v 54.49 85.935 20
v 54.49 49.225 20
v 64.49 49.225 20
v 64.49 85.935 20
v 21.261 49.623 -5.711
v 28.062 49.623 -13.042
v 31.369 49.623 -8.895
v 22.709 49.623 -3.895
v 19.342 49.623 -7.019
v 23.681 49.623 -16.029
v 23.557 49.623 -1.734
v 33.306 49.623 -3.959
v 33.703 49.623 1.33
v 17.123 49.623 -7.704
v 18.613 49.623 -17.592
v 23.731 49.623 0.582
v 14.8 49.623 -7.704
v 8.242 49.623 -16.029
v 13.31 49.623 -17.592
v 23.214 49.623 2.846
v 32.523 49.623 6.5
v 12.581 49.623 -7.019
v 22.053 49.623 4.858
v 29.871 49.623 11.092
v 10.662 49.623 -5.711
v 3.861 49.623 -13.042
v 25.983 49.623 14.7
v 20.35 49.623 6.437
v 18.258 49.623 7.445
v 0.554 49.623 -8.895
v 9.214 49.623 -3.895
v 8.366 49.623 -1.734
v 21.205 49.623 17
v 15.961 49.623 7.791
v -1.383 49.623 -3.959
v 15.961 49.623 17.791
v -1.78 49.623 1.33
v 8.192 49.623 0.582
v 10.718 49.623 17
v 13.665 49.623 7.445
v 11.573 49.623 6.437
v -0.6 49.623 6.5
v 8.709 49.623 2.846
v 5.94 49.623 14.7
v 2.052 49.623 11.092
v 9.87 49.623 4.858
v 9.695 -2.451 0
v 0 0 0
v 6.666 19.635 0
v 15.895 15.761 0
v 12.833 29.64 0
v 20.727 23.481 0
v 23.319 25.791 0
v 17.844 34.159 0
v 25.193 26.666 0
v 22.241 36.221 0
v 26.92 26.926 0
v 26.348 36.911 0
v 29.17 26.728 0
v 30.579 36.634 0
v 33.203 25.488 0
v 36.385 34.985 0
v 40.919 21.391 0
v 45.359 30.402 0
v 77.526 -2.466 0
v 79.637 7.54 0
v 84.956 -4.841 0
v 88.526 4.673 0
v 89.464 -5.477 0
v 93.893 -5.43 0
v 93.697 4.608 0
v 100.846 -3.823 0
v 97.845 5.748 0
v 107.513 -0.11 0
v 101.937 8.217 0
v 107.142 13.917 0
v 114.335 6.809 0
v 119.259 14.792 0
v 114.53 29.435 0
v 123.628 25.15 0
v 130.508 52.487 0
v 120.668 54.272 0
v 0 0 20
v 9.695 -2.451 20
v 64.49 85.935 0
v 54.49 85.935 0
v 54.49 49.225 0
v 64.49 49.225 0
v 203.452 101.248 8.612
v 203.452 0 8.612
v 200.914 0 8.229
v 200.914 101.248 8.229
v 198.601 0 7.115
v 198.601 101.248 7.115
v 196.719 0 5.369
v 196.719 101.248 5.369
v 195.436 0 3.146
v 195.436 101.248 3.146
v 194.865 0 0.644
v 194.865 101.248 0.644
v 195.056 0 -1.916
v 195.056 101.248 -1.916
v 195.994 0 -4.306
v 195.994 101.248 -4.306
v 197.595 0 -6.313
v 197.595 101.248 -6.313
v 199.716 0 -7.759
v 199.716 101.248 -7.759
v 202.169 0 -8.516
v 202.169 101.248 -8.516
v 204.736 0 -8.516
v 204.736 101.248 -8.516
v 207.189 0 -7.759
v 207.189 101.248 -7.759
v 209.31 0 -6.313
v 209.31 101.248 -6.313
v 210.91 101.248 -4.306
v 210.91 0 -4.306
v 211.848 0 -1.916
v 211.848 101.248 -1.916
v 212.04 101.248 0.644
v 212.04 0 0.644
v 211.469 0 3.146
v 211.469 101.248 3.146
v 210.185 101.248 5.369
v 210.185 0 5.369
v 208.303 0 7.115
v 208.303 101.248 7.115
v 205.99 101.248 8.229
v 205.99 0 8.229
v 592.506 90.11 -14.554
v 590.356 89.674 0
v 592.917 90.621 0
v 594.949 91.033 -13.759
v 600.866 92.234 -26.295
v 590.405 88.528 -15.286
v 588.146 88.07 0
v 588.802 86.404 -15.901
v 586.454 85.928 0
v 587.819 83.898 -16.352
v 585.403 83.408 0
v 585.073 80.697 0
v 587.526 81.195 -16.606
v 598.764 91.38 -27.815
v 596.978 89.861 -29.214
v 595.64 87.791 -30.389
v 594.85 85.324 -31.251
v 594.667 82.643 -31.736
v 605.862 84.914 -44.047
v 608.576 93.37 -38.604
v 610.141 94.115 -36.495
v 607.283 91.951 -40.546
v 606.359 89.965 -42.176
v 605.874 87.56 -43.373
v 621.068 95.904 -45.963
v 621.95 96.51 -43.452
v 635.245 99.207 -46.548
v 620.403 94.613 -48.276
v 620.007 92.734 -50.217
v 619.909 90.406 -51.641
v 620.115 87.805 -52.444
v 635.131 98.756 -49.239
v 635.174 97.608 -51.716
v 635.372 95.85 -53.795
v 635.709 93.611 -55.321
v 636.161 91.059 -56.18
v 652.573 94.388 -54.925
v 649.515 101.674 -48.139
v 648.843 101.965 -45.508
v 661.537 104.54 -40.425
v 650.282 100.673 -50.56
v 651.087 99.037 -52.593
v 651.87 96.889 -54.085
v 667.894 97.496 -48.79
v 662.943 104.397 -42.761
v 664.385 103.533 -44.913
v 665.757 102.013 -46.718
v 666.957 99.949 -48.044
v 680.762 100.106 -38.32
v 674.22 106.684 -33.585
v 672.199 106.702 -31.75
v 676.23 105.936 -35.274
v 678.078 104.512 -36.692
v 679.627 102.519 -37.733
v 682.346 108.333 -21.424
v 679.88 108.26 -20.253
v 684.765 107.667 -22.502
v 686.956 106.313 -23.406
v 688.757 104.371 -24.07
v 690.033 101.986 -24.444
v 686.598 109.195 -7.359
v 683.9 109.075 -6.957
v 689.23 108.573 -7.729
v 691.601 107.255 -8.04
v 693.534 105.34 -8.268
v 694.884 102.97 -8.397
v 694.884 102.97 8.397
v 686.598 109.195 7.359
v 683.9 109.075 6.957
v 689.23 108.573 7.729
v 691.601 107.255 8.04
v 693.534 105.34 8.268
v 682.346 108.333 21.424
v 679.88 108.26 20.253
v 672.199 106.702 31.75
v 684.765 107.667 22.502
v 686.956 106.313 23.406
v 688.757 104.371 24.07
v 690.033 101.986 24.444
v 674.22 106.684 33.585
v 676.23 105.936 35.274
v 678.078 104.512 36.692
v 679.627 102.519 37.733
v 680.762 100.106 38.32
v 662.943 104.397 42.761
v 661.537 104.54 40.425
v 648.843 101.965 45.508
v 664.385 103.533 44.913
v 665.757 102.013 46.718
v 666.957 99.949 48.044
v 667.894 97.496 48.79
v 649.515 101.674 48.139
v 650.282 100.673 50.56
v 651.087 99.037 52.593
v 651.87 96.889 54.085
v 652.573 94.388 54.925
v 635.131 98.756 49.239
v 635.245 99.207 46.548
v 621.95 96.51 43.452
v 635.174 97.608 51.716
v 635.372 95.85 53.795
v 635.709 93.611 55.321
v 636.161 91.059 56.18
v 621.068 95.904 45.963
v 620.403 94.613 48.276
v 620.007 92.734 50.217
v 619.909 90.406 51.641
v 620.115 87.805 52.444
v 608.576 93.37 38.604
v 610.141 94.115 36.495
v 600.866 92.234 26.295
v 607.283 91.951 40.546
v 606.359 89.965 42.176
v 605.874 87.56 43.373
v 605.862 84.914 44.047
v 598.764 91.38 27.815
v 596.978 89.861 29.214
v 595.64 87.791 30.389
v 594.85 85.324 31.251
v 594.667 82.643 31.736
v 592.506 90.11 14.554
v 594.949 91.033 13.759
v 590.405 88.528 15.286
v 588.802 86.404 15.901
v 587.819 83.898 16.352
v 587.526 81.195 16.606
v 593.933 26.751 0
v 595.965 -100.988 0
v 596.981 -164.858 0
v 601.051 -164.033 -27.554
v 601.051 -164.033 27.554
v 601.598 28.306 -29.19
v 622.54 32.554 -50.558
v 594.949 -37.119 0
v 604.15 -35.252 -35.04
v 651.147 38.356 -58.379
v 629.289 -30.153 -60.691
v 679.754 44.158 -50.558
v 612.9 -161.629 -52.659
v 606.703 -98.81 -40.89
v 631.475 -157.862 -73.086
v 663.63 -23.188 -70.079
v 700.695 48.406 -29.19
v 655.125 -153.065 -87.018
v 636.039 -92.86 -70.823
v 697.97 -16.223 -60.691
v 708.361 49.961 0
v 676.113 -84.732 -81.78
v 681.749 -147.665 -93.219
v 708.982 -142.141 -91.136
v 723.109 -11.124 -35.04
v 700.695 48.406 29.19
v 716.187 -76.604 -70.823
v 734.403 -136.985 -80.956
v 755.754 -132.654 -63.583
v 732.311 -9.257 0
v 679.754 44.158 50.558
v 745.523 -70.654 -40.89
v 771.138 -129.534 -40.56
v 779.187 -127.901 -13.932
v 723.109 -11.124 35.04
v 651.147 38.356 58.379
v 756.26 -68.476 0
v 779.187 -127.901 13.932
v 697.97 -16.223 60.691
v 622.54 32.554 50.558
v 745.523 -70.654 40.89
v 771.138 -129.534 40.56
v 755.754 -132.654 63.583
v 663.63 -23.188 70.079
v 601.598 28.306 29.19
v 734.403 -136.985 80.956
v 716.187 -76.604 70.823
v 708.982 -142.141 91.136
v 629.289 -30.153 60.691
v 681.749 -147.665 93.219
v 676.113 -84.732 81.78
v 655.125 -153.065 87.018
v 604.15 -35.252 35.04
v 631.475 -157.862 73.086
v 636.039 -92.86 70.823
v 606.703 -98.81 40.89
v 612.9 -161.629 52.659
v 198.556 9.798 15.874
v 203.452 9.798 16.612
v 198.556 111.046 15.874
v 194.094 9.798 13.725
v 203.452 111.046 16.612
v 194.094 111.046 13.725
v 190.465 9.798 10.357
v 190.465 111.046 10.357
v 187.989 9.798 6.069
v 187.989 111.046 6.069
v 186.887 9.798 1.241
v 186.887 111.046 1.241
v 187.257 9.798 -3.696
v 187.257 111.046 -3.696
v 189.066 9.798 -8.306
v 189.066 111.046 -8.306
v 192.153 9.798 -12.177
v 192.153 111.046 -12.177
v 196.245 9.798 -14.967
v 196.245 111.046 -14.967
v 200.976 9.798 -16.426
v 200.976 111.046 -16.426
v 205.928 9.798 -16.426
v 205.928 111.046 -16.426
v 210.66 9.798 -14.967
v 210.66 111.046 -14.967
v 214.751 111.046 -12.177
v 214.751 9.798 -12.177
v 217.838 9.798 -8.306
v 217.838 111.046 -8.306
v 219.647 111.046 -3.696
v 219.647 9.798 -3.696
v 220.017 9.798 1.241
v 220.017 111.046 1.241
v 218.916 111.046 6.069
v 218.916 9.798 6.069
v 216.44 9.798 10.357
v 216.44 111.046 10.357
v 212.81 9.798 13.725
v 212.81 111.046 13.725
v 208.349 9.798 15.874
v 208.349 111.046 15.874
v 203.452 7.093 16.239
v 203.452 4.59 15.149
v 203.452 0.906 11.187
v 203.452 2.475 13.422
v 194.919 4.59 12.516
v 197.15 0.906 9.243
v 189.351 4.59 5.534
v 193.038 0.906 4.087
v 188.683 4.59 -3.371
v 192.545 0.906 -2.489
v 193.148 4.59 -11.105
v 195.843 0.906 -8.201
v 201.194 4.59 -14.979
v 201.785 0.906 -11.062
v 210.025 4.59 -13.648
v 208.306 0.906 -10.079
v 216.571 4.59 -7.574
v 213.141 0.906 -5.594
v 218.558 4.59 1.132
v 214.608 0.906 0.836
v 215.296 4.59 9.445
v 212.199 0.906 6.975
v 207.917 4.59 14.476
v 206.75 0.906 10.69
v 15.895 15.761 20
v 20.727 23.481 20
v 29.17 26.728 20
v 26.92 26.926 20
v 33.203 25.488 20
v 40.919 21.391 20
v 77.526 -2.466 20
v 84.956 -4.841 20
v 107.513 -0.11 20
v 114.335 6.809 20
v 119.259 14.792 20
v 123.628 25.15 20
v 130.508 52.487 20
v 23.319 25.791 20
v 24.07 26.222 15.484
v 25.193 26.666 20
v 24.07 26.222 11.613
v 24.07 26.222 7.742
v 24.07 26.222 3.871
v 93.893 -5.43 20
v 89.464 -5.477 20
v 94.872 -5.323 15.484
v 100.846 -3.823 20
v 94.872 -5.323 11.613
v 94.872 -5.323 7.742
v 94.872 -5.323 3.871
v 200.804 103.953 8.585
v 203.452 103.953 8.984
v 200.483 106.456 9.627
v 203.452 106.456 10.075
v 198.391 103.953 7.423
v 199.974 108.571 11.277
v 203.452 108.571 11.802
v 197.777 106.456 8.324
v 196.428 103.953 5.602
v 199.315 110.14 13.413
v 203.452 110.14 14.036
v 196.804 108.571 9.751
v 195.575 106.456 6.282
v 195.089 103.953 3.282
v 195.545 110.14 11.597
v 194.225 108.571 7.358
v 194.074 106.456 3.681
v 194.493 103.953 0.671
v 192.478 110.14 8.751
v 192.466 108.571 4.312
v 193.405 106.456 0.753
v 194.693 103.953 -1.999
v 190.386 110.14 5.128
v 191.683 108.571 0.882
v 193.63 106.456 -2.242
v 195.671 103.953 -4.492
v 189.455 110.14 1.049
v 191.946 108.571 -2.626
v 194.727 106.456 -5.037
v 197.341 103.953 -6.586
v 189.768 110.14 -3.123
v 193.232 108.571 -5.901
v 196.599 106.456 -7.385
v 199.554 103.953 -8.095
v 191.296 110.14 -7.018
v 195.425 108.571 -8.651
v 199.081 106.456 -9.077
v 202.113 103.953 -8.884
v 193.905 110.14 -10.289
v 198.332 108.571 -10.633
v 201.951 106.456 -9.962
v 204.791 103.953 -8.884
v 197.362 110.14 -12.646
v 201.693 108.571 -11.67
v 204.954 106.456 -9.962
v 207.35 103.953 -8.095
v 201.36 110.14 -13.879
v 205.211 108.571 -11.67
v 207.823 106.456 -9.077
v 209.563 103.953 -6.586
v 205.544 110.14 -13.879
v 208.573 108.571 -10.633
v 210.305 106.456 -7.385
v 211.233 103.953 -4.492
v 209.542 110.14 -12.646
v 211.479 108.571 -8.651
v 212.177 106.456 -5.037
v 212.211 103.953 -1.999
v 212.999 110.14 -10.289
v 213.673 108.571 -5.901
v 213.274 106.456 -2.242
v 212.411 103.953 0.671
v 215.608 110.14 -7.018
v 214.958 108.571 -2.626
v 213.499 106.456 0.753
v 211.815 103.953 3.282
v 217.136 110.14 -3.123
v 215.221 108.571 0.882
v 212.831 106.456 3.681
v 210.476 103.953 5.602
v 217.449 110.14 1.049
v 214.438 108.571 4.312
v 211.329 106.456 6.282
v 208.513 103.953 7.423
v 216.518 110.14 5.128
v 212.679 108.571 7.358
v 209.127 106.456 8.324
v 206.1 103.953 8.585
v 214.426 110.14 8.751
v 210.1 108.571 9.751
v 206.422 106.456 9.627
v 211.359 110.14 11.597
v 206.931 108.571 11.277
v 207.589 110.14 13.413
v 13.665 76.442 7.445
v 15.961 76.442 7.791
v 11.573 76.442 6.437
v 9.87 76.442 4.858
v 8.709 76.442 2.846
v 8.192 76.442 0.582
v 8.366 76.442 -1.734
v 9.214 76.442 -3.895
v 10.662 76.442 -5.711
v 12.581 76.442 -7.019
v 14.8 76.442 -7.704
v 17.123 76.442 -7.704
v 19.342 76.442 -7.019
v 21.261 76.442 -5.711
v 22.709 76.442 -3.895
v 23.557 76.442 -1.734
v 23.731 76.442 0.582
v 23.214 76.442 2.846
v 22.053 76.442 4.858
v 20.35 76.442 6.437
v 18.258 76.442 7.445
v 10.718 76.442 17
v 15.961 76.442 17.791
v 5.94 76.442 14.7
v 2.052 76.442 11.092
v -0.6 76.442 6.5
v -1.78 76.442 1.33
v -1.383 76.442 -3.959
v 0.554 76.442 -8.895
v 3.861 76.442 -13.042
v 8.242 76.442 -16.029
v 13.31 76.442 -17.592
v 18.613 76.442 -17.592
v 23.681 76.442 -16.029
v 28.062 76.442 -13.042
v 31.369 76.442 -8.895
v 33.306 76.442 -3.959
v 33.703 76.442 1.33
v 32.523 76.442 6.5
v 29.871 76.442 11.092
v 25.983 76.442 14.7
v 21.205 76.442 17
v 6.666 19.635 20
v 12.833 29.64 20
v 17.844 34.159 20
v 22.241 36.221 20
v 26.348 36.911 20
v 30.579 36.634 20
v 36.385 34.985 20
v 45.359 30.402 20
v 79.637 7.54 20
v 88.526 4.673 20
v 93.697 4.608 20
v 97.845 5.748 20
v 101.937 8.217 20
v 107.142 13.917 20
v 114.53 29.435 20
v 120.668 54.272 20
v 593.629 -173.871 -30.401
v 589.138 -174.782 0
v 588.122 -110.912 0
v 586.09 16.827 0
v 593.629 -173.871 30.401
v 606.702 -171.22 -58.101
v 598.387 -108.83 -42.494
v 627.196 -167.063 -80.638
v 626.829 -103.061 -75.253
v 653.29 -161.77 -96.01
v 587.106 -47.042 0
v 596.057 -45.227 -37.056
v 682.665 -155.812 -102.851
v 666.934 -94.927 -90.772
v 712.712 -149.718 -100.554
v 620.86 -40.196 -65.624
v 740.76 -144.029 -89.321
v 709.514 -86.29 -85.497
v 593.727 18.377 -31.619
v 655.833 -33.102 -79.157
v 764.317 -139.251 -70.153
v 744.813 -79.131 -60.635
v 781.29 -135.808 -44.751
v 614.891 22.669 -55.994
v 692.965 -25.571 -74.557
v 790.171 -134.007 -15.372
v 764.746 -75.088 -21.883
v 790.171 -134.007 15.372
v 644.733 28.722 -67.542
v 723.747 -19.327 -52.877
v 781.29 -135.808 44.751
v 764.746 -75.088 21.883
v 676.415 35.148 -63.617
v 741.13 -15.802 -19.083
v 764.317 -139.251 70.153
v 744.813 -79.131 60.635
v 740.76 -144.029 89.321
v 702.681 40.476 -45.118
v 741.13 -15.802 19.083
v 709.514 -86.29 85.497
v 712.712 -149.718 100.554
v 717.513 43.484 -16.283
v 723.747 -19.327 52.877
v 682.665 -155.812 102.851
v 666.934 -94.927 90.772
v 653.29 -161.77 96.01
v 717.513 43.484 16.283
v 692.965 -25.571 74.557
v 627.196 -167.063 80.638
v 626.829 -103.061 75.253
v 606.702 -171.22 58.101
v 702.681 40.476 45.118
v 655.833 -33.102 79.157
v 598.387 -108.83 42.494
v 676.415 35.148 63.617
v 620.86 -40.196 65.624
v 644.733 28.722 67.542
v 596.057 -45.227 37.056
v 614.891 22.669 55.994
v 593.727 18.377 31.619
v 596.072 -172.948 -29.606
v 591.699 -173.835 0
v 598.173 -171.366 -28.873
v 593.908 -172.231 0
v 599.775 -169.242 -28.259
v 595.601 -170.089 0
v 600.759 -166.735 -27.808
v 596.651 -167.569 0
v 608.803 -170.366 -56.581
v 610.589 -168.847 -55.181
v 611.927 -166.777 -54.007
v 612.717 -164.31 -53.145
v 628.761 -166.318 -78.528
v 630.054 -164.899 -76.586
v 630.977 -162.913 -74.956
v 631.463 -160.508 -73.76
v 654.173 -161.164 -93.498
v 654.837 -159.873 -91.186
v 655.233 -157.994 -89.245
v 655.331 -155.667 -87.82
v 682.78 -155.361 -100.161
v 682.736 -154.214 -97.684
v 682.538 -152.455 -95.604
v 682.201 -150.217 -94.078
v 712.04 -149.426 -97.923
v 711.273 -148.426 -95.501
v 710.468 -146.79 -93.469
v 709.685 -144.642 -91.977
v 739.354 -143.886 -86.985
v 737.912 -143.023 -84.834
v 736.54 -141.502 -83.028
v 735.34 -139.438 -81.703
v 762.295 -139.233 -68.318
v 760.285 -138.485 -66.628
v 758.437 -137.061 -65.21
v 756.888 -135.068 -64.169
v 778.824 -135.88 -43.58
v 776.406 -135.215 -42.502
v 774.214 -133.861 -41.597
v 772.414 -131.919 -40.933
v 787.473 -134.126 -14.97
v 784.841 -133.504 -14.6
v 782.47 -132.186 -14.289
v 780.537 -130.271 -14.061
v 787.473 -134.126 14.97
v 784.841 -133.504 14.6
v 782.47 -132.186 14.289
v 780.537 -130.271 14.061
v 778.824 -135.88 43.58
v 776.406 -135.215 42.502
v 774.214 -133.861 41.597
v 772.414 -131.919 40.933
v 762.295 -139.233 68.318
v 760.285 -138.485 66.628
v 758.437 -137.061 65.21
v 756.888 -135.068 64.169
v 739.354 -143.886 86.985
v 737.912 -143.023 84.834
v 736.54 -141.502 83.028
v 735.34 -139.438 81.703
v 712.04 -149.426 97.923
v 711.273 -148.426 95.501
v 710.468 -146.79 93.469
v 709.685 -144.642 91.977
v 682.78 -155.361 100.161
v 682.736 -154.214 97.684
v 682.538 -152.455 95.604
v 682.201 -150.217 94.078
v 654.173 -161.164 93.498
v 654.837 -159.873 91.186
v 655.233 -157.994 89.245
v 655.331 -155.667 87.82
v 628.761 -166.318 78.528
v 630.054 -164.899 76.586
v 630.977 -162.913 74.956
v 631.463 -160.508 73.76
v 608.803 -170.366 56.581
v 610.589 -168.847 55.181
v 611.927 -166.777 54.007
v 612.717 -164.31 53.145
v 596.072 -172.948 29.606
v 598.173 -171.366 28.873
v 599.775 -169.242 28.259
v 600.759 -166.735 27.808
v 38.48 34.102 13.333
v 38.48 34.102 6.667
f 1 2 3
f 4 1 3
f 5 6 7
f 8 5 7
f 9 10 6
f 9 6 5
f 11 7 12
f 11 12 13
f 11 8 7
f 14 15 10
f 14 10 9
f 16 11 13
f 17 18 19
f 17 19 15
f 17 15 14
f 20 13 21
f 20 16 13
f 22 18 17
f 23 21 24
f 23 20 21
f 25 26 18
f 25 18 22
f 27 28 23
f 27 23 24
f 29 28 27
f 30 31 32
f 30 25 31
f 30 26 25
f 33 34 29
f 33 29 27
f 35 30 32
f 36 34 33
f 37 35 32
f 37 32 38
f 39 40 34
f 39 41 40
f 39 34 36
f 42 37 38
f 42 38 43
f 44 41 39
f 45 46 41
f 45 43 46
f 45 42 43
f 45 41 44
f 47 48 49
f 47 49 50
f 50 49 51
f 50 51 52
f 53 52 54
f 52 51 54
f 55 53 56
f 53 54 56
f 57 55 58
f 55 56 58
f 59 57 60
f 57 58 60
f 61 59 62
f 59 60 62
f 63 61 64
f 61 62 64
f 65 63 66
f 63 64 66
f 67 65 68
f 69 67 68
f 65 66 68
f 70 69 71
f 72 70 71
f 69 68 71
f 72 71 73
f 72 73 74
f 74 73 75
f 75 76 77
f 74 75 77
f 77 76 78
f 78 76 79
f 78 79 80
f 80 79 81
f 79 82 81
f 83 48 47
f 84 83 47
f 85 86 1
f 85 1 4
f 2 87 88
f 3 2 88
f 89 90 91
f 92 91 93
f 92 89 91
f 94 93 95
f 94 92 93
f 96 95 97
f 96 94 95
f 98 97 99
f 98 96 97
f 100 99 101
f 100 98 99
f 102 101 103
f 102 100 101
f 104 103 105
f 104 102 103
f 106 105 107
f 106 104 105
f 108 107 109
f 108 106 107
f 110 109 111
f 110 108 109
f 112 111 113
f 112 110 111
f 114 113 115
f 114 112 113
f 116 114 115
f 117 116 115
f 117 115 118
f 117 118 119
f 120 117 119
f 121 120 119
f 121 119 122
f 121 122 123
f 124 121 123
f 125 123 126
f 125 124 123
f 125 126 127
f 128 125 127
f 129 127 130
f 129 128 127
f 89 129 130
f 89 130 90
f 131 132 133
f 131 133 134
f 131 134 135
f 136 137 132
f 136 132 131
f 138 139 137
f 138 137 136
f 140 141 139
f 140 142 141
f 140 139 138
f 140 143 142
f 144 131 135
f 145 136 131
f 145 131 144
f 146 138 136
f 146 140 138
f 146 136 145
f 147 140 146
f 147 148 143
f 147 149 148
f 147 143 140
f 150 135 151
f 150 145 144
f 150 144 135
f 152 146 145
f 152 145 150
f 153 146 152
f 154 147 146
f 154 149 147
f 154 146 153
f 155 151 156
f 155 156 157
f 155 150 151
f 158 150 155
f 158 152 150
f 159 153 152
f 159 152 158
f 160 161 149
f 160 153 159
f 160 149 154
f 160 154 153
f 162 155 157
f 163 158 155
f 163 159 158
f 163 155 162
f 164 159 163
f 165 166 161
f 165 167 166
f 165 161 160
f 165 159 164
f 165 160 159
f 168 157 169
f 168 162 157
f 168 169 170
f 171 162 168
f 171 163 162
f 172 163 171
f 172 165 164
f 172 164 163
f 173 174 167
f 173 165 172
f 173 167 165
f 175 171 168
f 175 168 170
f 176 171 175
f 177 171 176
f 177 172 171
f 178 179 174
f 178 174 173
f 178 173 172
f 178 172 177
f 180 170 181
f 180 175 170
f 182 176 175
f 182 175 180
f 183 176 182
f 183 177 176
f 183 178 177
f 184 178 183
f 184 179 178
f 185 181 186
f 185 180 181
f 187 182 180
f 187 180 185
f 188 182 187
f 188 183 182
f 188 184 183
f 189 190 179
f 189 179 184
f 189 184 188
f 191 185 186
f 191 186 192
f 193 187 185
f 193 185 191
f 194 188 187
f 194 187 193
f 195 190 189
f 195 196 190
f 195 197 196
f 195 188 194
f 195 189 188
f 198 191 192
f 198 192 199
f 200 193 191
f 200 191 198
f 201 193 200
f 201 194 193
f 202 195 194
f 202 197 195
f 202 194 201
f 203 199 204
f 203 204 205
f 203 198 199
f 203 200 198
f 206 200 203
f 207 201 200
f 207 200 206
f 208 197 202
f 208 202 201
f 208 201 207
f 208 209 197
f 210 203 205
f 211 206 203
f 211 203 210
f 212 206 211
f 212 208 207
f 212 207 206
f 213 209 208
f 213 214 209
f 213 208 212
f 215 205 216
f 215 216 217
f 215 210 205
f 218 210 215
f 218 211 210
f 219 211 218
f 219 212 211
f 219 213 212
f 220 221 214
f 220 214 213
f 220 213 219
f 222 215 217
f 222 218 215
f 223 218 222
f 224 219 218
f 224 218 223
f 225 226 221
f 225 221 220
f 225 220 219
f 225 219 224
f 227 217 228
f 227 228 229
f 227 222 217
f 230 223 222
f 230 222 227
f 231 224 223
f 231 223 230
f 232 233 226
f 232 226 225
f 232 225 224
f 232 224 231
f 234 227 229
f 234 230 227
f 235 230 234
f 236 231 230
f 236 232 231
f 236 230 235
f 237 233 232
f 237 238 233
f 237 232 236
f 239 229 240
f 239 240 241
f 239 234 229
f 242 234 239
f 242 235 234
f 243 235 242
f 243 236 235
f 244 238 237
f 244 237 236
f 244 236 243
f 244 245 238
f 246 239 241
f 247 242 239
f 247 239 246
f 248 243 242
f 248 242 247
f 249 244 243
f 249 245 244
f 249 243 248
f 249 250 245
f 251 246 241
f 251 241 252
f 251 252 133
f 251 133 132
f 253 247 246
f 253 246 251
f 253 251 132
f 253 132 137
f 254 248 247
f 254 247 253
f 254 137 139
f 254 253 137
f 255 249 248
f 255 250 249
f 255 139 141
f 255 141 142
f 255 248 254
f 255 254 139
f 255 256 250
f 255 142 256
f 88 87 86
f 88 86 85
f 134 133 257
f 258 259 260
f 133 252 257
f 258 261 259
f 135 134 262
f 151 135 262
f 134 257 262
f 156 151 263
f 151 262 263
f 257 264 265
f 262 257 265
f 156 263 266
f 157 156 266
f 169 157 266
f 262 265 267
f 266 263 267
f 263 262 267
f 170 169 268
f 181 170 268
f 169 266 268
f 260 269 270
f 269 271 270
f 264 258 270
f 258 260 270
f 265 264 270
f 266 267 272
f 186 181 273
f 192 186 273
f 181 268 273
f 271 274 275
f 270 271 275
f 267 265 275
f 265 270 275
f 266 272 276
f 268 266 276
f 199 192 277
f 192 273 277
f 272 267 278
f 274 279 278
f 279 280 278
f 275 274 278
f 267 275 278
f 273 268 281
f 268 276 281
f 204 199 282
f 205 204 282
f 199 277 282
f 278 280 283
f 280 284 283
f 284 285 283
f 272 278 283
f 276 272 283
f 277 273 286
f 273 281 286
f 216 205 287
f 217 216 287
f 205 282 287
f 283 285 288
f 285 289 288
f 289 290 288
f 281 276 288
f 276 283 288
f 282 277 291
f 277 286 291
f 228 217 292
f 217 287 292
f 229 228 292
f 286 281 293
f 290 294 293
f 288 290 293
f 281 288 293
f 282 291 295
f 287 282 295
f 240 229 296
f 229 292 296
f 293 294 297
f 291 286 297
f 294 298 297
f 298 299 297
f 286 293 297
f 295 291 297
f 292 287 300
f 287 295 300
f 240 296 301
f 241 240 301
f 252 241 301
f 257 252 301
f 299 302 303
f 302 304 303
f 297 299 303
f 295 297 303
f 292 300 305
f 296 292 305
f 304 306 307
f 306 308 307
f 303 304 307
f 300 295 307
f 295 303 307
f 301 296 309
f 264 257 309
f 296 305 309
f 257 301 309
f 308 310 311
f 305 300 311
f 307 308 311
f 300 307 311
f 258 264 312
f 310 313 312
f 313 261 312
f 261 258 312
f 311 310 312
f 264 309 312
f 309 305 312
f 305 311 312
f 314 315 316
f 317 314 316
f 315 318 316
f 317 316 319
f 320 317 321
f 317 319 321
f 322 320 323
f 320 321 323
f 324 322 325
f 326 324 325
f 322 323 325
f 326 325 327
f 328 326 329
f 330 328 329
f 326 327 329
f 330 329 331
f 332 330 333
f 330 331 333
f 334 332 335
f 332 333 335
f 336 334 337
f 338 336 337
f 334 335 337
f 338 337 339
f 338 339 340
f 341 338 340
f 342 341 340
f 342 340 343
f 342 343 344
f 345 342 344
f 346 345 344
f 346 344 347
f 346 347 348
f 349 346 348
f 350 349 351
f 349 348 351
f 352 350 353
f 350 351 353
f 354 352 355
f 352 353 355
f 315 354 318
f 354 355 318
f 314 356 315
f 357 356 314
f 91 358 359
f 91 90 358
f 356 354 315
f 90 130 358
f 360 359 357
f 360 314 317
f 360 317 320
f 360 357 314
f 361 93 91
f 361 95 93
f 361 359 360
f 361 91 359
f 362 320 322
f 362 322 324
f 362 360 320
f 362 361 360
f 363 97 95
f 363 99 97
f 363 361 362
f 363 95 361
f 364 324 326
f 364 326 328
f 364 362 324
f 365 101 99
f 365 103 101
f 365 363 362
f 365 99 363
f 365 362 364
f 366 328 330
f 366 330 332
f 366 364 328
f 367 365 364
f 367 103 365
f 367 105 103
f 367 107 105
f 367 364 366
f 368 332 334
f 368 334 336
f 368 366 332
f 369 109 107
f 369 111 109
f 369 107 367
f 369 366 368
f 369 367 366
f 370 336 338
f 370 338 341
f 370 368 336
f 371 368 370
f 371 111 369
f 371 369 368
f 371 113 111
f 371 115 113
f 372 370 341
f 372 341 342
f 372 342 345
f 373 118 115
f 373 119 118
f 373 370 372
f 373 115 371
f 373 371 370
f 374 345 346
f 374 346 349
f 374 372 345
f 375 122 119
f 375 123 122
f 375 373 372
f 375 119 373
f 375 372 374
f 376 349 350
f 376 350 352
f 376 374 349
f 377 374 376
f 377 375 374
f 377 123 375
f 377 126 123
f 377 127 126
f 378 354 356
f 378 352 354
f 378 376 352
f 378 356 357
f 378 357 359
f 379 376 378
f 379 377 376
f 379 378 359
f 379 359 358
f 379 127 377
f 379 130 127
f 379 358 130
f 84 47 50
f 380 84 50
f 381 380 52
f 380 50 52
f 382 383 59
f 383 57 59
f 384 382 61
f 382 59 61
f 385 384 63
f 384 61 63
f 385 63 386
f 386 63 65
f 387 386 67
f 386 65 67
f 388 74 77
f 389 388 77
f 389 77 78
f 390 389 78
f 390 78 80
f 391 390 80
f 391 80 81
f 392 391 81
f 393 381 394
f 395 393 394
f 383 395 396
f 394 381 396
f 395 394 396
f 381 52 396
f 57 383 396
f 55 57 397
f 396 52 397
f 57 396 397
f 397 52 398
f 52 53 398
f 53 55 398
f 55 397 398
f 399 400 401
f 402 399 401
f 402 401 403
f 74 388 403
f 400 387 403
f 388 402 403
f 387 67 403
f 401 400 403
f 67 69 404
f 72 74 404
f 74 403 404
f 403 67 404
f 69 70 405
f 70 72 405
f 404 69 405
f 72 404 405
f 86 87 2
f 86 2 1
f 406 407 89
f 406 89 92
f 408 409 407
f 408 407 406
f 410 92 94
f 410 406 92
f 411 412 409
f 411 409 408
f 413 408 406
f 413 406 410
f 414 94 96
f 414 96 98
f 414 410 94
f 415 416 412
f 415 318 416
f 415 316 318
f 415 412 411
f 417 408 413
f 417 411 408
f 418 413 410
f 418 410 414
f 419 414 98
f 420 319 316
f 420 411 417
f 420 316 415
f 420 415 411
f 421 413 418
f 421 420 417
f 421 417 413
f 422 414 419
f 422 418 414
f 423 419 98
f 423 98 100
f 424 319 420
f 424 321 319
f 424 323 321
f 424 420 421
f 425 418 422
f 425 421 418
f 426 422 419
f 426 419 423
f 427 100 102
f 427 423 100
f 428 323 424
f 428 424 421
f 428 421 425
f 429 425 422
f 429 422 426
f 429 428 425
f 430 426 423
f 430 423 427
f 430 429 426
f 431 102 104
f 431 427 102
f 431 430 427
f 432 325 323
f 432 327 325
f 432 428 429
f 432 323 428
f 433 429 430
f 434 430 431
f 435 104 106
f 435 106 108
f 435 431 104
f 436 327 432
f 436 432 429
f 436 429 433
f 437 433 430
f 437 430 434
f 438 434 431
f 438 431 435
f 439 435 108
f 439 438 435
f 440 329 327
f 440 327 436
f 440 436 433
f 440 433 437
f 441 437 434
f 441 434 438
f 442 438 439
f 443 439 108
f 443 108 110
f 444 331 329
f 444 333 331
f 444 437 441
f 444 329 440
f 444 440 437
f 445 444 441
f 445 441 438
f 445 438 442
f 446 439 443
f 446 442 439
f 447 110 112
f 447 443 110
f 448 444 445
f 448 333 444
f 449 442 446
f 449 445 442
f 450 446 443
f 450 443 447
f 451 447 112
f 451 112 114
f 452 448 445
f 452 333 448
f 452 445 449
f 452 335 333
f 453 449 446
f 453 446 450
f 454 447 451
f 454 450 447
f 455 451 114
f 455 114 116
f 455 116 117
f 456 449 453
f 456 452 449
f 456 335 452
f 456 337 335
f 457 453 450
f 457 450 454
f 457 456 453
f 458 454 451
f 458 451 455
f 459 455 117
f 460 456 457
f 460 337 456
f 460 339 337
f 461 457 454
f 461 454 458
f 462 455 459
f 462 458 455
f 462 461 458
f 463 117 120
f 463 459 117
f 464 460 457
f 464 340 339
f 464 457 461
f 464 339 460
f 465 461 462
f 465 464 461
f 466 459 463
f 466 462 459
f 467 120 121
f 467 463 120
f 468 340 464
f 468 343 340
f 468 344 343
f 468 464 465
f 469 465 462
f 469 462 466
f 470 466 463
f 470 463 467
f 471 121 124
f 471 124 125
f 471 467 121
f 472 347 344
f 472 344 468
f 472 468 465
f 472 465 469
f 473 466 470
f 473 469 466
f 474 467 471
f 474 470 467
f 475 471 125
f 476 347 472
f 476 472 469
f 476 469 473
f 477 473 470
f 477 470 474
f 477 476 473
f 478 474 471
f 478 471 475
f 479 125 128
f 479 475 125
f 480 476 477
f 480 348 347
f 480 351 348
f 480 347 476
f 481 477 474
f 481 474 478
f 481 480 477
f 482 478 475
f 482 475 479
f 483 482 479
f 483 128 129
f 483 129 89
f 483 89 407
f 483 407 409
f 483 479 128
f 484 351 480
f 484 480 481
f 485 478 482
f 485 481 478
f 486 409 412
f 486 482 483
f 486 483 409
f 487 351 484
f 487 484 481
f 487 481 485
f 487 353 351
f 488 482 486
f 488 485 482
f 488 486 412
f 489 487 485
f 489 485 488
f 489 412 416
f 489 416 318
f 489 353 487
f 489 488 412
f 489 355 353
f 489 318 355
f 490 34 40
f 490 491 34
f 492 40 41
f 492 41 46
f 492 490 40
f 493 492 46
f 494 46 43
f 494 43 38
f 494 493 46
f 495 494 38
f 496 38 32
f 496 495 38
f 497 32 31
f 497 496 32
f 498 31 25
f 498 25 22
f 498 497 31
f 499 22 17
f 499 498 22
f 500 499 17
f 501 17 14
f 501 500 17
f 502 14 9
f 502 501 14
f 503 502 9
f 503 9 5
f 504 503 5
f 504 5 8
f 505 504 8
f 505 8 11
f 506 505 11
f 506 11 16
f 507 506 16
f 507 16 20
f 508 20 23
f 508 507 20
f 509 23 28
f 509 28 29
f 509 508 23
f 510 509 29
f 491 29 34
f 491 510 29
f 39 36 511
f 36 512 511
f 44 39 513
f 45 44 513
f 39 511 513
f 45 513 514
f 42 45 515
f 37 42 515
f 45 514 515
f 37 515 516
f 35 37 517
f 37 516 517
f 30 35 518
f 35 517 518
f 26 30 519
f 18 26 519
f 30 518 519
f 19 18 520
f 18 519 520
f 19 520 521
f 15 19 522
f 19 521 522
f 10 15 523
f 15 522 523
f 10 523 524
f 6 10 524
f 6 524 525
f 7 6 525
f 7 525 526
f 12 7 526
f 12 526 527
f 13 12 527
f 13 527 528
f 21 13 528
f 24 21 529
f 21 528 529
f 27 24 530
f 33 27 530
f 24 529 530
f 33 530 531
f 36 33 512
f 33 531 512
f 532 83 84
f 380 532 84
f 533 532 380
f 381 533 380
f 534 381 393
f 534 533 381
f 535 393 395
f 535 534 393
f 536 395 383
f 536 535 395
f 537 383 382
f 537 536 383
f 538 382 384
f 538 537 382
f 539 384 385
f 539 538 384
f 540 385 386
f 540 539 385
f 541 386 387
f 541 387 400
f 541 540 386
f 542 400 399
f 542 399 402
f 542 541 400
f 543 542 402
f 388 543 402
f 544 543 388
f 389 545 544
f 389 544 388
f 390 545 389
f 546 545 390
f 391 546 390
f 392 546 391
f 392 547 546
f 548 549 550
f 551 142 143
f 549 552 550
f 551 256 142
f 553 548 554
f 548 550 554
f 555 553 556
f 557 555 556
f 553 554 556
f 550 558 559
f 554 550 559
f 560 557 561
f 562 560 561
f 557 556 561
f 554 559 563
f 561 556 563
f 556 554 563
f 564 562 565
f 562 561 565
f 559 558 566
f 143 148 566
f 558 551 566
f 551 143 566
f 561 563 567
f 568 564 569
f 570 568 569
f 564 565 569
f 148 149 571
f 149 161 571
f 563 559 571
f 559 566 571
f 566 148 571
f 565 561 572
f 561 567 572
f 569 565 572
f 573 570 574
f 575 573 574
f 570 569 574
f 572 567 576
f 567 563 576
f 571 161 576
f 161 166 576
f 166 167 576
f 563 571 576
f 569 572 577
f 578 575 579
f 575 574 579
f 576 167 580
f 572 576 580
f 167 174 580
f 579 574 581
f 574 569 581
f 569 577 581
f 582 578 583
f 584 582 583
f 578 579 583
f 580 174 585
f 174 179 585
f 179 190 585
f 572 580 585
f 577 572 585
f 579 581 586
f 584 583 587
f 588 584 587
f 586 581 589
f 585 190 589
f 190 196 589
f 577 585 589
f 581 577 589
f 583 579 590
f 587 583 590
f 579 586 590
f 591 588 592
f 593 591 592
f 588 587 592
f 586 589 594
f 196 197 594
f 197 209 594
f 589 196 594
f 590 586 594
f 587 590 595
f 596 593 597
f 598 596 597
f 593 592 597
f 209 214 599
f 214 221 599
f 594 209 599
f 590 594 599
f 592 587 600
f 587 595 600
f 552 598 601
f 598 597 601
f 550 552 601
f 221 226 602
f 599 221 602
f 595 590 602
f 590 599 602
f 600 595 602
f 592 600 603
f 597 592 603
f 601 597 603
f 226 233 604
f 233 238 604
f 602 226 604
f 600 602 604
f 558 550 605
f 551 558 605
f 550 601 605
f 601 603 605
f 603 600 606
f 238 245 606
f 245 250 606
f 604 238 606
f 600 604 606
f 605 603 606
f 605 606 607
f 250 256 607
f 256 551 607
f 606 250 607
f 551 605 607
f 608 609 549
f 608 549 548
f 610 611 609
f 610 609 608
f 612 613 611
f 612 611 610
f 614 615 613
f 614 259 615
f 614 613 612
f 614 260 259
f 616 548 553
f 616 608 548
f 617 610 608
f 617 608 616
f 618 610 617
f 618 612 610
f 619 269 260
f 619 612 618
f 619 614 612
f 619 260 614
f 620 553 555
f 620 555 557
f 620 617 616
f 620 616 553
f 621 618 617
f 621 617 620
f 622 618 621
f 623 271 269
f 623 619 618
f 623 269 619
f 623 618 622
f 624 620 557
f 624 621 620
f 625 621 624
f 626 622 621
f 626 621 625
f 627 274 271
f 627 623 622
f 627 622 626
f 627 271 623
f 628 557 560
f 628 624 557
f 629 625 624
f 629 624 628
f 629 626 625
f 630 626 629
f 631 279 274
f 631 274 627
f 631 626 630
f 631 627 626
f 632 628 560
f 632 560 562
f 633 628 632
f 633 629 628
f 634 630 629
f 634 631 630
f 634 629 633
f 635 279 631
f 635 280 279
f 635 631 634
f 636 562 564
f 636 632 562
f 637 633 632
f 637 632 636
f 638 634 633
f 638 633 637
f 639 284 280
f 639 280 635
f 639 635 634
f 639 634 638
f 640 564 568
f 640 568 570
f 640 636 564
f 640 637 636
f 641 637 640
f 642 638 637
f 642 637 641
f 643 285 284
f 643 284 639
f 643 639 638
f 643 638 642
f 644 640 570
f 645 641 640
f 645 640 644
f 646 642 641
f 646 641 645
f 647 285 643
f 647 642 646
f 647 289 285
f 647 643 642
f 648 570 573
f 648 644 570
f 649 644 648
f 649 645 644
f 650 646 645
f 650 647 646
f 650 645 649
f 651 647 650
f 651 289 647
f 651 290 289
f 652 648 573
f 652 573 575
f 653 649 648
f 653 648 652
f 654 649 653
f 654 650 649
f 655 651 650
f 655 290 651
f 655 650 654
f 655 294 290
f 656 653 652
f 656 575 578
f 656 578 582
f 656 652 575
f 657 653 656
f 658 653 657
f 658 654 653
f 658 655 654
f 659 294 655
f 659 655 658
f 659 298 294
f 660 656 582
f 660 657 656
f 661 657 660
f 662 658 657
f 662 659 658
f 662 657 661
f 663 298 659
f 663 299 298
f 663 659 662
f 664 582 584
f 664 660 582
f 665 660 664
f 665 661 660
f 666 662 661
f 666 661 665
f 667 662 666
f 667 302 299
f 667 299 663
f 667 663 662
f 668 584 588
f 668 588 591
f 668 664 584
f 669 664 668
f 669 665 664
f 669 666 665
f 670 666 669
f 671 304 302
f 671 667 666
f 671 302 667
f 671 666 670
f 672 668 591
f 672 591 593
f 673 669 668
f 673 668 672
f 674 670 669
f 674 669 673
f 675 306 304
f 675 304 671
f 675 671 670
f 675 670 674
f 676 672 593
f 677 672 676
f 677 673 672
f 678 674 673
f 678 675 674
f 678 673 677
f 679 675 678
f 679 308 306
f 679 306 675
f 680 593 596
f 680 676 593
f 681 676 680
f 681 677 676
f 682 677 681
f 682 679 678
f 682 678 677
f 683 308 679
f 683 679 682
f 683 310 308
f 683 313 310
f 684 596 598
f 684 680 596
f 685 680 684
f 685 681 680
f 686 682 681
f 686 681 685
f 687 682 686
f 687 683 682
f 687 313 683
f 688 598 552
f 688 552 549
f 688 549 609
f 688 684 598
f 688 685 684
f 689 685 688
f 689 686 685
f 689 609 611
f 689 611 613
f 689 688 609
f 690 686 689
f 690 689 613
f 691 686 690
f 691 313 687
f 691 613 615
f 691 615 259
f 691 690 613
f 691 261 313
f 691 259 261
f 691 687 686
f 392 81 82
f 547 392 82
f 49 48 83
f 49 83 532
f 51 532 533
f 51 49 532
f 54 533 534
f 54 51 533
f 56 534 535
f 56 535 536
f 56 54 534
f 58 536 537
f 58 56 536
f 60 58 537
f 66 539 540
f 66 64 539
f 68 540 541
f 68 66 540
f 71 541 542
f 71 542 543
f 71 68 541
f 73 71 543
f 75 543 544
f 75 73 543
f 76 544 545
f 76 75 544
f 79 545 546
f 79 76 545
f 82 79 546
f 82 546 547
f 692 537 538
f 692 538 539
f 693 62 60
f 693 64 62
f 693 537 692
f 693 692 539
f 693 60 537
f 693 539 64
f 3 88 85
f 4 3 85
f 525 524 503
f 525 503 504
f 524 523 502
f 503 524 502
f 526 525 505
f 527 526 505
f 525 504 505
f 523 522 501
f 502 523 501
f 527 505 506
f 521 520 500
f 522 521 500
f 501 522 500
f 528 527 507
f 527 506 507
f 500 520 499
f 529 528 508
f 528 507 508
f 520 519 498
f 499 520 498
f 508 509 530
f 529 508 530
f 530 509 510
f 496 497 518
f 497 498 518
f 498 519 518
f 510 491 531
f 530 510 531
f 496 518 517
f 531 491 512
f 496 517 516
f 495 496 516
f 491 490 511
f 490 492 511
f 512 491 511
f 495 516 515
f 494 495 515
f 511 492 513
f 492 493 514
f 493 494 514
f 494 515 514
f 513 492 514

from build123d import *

# Parameters (mm, degrees)
EXTRUDE_THIN1_OUTLINE_W = 9.999999999999993
EXTRUDE_THIN1_OUTLINE_H = 36.710134862
EXTRUDE_THIN1_DEPTH     = 20
SKETCH3_W               = 10
SKETCH3_H               = 26.81861266200005
SKETCH4_W               = 8
SKETCH4_H               = 111.0463440008494
FILLET1_R               = 10
FILLET2_R               = 10
FILLET6_R               = 10
FILLET7_R               = 10


# Read off the part's stored shape, not the designer's step: Extrude-Thin1
with BuildPart() as part:
    # Extrude-Thin1 outline → Extrude-Thin1 (new body)
    with BuildSketch(Plane.XY):
        with Locations((59.489938632999994, 67.579713016)):
            Rectangle(EXTRUDE_THIN1_OUTLINE_W, EXTRUDE_THIN1_OUTLINE_H)
        with BuildLine():
            Line((0, 0), (9.694909236, -2.4512721))
            add(Edge.make_bspline(
                [(9.694909236, -2.4512721), (10.5311688474778, 0.856178359172851), (11.394386774256, 3.84419741254524), (13.1533592305206, 9.20694051284605), (14.0492896362296, 11.5815145840632), (15.8413121087331, 15.742658734528), (16.737517517862, 17.5287647227855), (18.4814345025707, 20.5463967391919), (19.3286793802721, 21.7769702062188), (20.9123918030556, 23.7460025130972), (21.6468668792936, 24.4838050755776), (22.9626621572418, 25.5880403665081), (23.5417164826069, 25.9567946857274), (24.5982667995349, 26.4876499635343), (25.0784708138462, 26.6536744426382), (26.0947773614352, 26.8786677388824), (26.6354672734258, 26.9362581428574), (27.9016220528546, 26.9202105728274), (28.6267698076733, 26.8433228296364), (30.2827198681421, 26.501626749094), (31.2115323200941, 26.2360905599305), (33.2381790124912, 25.4970253861064), (34.3350401710325, 25.0239655597566), (36.6545545212303, 23.8839035231942), (37.8770010886368, 23.2173466425486), (40.413779447504, 21.7212794308362), (41.7281493534382, 20.8920027901708), (44.4249998964398, 19.1079431631433), (45.8075500630837, 18.1532614063299), (50.0335414120897, 15.1597754687626), (52.9529117796699, 12.9920070265115), (58.9368445543254, 8.62200824840444), (62.0007966750851, 6.41938014676282), (66.7257978693274, 3.31532694879324), (68.3230359680193, 2.313869999449), (71.5770117142215, 0.417572758509964), (73.2337136485033, -0.477527792876216), (76.6317569670157, -2.11375987107278), (78.3733528188264, -2.85538269335876), (81.9745983323873, -4.11884560626711), (83.8353857946341, -4.64115314789327), (87.6984061214208, -5.36551199552065), (89.7028005800273, -5.56654784071354), (92.7872249227571, -5.52733551388739), (93.8275778829024, -5.45729724278707), (95.9174101948477, -5.18908376162479), (96.9667901072056, -4.99079603224231), (99.0536589714669, -4.45778102161726), (100.0909704087, -4.12302677221439), (102.131284140322, -3.3172969507252), (103.13412254263, -2.84641134529941), (106.063715631323, -1.24117058796995), (107.907320493612, 0.0849084234402593), (111.324584701444, 3.16057354469398), (112.900958390548, 4.90829500464283), (115.827345406093, 8.7851531963294), (117.179193265889, 10.9152075498616), (119.713037579898, 15.5776997205682), (120.895351993834, 18.1110774147558), (123.128090663281, 23.6279089006282), (124.178355260339, 26.6117757902841), (127.162248988825, 36.3184054964138), (128.931571554216, 43.7980034470408), (130.507605163, 52.487115477)],
                knots=[0, 0, 0, 0, 0.03125, 0.03125, 0.0624999999999999, 0.0624999999999999, 0.0937499999999999, 0.0937499999999999, 0.125, 0.125, 0.15625, 0.15625, 0.1875, 0.1875, 0.21875, 0.21875, 0.25, 0.25, 0.28125, 0.28125, 0.3125, 0.3125, 0.34375, 0.34375, 0.375, 0.375, 0.40625, 0.40625, 0.4375, 0.4375, 0.5, 0.5, 0.5625, 0.5625, 0.59375, 0.59375, 0.625, 0.625, 0.65625, 0.65625, 0.6875, 0.6875, 0.71875, 0.71875, 0.734375, 0.734375, 0.75, 0.75, 0.765625, 0.765625, 0.78125, 0.78125, 0.8125, 0.8125, 0.84375, 0.84375, 0.875, 0.875, 0.90625, 0.90625, 0.9375, 0.9375, 1, 1, 1, 1], degree=3))
            Line((130.507605163, 52.487115477), (120.668148619, 54.2717989))
            add(Edge.make_bspline(
                [(0, 0), (28.3563158244911, 112.15071072711), (96.3343394540236, -79.8872652449302), (120.668148619, 54.2717989)],
                knots=[0, 0, 0, 0, 1, 1, 1, 1], degree=3))
        make_face()
    extrude(amount=EXTRUDE_THIN1_DEPTH)


with BuildPart() as body_2:
    # Sketch3 → Revolve-Thin1 (revolve)
    with BuildSketch(Plane.XY, mode=Mode.PRIVATE) as revolve_thin1_sk:
        with Locations((3.1706102671758742, 63.03237569384922)):
            Rectangle(SKETCH3_W, SKETCH3_H)
    revolve(revolve_thin1_sk.sketch.rotate(Axis((15.961492157812756, 76.44168202484924, 0), (0, -1, 0)), 270), axis=Axis((15.961492157812756, 76.44168202484924, 0), (0, -1, 0)))


with BuildPart() as body_3:
    # Sketch4 → Revolve-Thin2 (revolve)
    with BuildSketch(Plane.XY, mode=Mode.PRIVATE) as revolve_thin2_sk:
        with Locations((190.84042517006557, 55.5231720004247)):
            Rectangle(SKETCH4_W, SKETCH4_H)
    revolve(revolve_thin2_sk.sketch.rotate(Axis((203.4521186248573, 111.04634400084939, 0), (0, -1, 0)), 270), axis=Axis((203.4521186248573, 111.04634400084939, 0), (0, -1, 0)))

    # Fillet1
    # the kernel refuses this fillet: 10 mm, written as the material it takes off along each edge
    with BuildSketch(Plane(origin=(203.4521186248573, 111.04634400084939, 0), x_dir=(0, 0, 1), z_dir=(1, 0, 0))) as fillet1_piece_1:
        with BuildLine():
            CenterArc((18.61169345479169, 9.797958971132715), FILLET1_R, 180, 78.4630409671845)
            Line((16.61169345479169, 0), (16.571693454791692, -0.19595917942265828))
            ThreePointArc((16.571693454791692, -0.19595917942265828), (12.611693454791691, -0.20000000000000284), (8.611693454791691, -0.20000000000000284))
            Line((8.611693454791691, -0.20000000000000284), (8.411693454791692, 0))
            Line((8.411693454791692, 0), (8.411693454791692, 9.797958971132715))
            Line((8.411693454791692, 9.797958971132715), (8.611693454791691, 9.797958971132715))
        make_face()
    revolve(axis=Axis((203.4521186248573, 111.04634400084939, 0), (0, -1, 0)), mode=Mode.SUBTRACT)

    # Fillet2
    # the kernel refuses this fillet: 10 mm, written as the material it takes off along each edge
    with BuildSketch(Plane(origin=(203.4521186248573, 0, 0), x_dir=(1.71e-15, 0, 1), z_dir=(1, 0, -1.71e-15))) as fillet2_piece_1:
        with BuildLine():
            CenterArc((6.611693454791691, -9.797958971132712), FILLET2_R, 0, 78.4630409671845)
            Line((16.61169345479169, -9.797958971132712), (16.81169345479169, -9.797958971132712))
            Line((16.81169345479169, -9.797958971132712), (16.81169345479169, 0))
            Line((16.81169345479169, 0), (16.61169345479169, 0.2))
            ThreePointArc((16.61169345479169, 0.2), (12.611693454791691, 0.2), (8.65169345479169, 0.19595917942265426))
            Line((8.65169345479169, 0.19595917942265426), (8.611693454791691, 0))
        make_face()
    revolve(axis=Axis((203.4521186248573, 0, 0), (0, -1, 0)), mode=Mode.SUBTRACT)


with BuildPart() as body_4:
    # Sketch8 → Revolve-Thin3 (revolve)
    with BuildSketch(Plane.XY):
        Polygon((592.9165543990568, 90.62123521338879), (597.1368581551377, -174.65500088312245), (589.1378703596948, -174.78225750714086), (584.917566603614, 90.49397858937037), align=None)
    revolve(axis=Axis((640.5456967891123, 90.62123521338879, 0), (0.19878243707787766, -0.9800436432676759, 0)))

    # Fillet6
    # the kernel refuses this fillet: 10 mm, written as the material it takes off along each edge
    with BuildSketch(Plane(origin=(638.3723729729767, 101.33622705108073, 0), x_dir=(-0.9800436432676759, -0.19878243707787757, 0), z_dir=(0, 0, 1))) as fillet6_piece_1:
        with BuildLine():
            CenterArc((46.507144024662985, 11.463870621378966), FILLET6_R, 270.9826376087404, 78.46304096718501)
            Line((46.67863823366485, 1.465341242701382), (46.68206811784489, 1.2653706551278228))
            ThreePointArc((46.68206811784489, 1.2653706551278228), (50.57433146427542, 0.5360542832667986), (54.50665822595351, -0.19661633808389894))
            Line((54.50665822595351, -0.19661633808389894), (54.739908095105, -0.03663353106753944))
            Line((54.739908095105, -0.03663353106753944), (56.534577266942115, 9.595560536934707))
            Line((56.534577266942115, 9.595560536934707), (56.33796092885816, 9.632194068002248))
        make_face()
    revolve(axis=Axis((638.3723729729767, 101.33622705108073, 0), (0.19878243707787766, -0.9800436432676759, 0)), mode=Mode.SUBTRACT)

    # Fillet7
    # the kernel refuses this fillet: 10 mm, written as the material it takes off along each edge
    with BuildSketch(Plane(origin=(690.5103330727782, -155.71604134794063, 0), x_dir=(-0.9800436432676758, -0.19878243707787768, 0), z_dir=(0, 0, 0.9999999999999999))) as fillet7_piece_1:
        with BuildLine():
            CenterArc((103.31096080732812, -11.463870621378936), FILLET7_R, 90.98263760874039, 78.46304096718495)
            Line((103.13946659832625, -1.4653412427013406), (103.1360367141462, -1.265370655127797))
            ThreePointArc((103.1360367141462, -1.265370655127797), (99.24377336771579, -0.5360542832668204), (95.31144660603758, 0.19661633808389678))
            Line((95.31144660603758, 0.19661633808389678), (95.07819673688608, 0.03663353106753908))
            Line((95.07819673688608, 0.03663353106753908), (93.28352756504898, -9.595560536934663))
            Line((93.28352756504898, -9.595560536934663), (93.48014390313294, -9.632194068002203))
        make_face()
    revolve(axis=Axis((690.5103330727782, -155.71604134794063, 0), (0.19878243707787766, -0.9800436432676759, 0)), mode=Mode.SUBTRACT)


solid = Compound([part.part, body_2.part, body_3.part, body_4.part])
